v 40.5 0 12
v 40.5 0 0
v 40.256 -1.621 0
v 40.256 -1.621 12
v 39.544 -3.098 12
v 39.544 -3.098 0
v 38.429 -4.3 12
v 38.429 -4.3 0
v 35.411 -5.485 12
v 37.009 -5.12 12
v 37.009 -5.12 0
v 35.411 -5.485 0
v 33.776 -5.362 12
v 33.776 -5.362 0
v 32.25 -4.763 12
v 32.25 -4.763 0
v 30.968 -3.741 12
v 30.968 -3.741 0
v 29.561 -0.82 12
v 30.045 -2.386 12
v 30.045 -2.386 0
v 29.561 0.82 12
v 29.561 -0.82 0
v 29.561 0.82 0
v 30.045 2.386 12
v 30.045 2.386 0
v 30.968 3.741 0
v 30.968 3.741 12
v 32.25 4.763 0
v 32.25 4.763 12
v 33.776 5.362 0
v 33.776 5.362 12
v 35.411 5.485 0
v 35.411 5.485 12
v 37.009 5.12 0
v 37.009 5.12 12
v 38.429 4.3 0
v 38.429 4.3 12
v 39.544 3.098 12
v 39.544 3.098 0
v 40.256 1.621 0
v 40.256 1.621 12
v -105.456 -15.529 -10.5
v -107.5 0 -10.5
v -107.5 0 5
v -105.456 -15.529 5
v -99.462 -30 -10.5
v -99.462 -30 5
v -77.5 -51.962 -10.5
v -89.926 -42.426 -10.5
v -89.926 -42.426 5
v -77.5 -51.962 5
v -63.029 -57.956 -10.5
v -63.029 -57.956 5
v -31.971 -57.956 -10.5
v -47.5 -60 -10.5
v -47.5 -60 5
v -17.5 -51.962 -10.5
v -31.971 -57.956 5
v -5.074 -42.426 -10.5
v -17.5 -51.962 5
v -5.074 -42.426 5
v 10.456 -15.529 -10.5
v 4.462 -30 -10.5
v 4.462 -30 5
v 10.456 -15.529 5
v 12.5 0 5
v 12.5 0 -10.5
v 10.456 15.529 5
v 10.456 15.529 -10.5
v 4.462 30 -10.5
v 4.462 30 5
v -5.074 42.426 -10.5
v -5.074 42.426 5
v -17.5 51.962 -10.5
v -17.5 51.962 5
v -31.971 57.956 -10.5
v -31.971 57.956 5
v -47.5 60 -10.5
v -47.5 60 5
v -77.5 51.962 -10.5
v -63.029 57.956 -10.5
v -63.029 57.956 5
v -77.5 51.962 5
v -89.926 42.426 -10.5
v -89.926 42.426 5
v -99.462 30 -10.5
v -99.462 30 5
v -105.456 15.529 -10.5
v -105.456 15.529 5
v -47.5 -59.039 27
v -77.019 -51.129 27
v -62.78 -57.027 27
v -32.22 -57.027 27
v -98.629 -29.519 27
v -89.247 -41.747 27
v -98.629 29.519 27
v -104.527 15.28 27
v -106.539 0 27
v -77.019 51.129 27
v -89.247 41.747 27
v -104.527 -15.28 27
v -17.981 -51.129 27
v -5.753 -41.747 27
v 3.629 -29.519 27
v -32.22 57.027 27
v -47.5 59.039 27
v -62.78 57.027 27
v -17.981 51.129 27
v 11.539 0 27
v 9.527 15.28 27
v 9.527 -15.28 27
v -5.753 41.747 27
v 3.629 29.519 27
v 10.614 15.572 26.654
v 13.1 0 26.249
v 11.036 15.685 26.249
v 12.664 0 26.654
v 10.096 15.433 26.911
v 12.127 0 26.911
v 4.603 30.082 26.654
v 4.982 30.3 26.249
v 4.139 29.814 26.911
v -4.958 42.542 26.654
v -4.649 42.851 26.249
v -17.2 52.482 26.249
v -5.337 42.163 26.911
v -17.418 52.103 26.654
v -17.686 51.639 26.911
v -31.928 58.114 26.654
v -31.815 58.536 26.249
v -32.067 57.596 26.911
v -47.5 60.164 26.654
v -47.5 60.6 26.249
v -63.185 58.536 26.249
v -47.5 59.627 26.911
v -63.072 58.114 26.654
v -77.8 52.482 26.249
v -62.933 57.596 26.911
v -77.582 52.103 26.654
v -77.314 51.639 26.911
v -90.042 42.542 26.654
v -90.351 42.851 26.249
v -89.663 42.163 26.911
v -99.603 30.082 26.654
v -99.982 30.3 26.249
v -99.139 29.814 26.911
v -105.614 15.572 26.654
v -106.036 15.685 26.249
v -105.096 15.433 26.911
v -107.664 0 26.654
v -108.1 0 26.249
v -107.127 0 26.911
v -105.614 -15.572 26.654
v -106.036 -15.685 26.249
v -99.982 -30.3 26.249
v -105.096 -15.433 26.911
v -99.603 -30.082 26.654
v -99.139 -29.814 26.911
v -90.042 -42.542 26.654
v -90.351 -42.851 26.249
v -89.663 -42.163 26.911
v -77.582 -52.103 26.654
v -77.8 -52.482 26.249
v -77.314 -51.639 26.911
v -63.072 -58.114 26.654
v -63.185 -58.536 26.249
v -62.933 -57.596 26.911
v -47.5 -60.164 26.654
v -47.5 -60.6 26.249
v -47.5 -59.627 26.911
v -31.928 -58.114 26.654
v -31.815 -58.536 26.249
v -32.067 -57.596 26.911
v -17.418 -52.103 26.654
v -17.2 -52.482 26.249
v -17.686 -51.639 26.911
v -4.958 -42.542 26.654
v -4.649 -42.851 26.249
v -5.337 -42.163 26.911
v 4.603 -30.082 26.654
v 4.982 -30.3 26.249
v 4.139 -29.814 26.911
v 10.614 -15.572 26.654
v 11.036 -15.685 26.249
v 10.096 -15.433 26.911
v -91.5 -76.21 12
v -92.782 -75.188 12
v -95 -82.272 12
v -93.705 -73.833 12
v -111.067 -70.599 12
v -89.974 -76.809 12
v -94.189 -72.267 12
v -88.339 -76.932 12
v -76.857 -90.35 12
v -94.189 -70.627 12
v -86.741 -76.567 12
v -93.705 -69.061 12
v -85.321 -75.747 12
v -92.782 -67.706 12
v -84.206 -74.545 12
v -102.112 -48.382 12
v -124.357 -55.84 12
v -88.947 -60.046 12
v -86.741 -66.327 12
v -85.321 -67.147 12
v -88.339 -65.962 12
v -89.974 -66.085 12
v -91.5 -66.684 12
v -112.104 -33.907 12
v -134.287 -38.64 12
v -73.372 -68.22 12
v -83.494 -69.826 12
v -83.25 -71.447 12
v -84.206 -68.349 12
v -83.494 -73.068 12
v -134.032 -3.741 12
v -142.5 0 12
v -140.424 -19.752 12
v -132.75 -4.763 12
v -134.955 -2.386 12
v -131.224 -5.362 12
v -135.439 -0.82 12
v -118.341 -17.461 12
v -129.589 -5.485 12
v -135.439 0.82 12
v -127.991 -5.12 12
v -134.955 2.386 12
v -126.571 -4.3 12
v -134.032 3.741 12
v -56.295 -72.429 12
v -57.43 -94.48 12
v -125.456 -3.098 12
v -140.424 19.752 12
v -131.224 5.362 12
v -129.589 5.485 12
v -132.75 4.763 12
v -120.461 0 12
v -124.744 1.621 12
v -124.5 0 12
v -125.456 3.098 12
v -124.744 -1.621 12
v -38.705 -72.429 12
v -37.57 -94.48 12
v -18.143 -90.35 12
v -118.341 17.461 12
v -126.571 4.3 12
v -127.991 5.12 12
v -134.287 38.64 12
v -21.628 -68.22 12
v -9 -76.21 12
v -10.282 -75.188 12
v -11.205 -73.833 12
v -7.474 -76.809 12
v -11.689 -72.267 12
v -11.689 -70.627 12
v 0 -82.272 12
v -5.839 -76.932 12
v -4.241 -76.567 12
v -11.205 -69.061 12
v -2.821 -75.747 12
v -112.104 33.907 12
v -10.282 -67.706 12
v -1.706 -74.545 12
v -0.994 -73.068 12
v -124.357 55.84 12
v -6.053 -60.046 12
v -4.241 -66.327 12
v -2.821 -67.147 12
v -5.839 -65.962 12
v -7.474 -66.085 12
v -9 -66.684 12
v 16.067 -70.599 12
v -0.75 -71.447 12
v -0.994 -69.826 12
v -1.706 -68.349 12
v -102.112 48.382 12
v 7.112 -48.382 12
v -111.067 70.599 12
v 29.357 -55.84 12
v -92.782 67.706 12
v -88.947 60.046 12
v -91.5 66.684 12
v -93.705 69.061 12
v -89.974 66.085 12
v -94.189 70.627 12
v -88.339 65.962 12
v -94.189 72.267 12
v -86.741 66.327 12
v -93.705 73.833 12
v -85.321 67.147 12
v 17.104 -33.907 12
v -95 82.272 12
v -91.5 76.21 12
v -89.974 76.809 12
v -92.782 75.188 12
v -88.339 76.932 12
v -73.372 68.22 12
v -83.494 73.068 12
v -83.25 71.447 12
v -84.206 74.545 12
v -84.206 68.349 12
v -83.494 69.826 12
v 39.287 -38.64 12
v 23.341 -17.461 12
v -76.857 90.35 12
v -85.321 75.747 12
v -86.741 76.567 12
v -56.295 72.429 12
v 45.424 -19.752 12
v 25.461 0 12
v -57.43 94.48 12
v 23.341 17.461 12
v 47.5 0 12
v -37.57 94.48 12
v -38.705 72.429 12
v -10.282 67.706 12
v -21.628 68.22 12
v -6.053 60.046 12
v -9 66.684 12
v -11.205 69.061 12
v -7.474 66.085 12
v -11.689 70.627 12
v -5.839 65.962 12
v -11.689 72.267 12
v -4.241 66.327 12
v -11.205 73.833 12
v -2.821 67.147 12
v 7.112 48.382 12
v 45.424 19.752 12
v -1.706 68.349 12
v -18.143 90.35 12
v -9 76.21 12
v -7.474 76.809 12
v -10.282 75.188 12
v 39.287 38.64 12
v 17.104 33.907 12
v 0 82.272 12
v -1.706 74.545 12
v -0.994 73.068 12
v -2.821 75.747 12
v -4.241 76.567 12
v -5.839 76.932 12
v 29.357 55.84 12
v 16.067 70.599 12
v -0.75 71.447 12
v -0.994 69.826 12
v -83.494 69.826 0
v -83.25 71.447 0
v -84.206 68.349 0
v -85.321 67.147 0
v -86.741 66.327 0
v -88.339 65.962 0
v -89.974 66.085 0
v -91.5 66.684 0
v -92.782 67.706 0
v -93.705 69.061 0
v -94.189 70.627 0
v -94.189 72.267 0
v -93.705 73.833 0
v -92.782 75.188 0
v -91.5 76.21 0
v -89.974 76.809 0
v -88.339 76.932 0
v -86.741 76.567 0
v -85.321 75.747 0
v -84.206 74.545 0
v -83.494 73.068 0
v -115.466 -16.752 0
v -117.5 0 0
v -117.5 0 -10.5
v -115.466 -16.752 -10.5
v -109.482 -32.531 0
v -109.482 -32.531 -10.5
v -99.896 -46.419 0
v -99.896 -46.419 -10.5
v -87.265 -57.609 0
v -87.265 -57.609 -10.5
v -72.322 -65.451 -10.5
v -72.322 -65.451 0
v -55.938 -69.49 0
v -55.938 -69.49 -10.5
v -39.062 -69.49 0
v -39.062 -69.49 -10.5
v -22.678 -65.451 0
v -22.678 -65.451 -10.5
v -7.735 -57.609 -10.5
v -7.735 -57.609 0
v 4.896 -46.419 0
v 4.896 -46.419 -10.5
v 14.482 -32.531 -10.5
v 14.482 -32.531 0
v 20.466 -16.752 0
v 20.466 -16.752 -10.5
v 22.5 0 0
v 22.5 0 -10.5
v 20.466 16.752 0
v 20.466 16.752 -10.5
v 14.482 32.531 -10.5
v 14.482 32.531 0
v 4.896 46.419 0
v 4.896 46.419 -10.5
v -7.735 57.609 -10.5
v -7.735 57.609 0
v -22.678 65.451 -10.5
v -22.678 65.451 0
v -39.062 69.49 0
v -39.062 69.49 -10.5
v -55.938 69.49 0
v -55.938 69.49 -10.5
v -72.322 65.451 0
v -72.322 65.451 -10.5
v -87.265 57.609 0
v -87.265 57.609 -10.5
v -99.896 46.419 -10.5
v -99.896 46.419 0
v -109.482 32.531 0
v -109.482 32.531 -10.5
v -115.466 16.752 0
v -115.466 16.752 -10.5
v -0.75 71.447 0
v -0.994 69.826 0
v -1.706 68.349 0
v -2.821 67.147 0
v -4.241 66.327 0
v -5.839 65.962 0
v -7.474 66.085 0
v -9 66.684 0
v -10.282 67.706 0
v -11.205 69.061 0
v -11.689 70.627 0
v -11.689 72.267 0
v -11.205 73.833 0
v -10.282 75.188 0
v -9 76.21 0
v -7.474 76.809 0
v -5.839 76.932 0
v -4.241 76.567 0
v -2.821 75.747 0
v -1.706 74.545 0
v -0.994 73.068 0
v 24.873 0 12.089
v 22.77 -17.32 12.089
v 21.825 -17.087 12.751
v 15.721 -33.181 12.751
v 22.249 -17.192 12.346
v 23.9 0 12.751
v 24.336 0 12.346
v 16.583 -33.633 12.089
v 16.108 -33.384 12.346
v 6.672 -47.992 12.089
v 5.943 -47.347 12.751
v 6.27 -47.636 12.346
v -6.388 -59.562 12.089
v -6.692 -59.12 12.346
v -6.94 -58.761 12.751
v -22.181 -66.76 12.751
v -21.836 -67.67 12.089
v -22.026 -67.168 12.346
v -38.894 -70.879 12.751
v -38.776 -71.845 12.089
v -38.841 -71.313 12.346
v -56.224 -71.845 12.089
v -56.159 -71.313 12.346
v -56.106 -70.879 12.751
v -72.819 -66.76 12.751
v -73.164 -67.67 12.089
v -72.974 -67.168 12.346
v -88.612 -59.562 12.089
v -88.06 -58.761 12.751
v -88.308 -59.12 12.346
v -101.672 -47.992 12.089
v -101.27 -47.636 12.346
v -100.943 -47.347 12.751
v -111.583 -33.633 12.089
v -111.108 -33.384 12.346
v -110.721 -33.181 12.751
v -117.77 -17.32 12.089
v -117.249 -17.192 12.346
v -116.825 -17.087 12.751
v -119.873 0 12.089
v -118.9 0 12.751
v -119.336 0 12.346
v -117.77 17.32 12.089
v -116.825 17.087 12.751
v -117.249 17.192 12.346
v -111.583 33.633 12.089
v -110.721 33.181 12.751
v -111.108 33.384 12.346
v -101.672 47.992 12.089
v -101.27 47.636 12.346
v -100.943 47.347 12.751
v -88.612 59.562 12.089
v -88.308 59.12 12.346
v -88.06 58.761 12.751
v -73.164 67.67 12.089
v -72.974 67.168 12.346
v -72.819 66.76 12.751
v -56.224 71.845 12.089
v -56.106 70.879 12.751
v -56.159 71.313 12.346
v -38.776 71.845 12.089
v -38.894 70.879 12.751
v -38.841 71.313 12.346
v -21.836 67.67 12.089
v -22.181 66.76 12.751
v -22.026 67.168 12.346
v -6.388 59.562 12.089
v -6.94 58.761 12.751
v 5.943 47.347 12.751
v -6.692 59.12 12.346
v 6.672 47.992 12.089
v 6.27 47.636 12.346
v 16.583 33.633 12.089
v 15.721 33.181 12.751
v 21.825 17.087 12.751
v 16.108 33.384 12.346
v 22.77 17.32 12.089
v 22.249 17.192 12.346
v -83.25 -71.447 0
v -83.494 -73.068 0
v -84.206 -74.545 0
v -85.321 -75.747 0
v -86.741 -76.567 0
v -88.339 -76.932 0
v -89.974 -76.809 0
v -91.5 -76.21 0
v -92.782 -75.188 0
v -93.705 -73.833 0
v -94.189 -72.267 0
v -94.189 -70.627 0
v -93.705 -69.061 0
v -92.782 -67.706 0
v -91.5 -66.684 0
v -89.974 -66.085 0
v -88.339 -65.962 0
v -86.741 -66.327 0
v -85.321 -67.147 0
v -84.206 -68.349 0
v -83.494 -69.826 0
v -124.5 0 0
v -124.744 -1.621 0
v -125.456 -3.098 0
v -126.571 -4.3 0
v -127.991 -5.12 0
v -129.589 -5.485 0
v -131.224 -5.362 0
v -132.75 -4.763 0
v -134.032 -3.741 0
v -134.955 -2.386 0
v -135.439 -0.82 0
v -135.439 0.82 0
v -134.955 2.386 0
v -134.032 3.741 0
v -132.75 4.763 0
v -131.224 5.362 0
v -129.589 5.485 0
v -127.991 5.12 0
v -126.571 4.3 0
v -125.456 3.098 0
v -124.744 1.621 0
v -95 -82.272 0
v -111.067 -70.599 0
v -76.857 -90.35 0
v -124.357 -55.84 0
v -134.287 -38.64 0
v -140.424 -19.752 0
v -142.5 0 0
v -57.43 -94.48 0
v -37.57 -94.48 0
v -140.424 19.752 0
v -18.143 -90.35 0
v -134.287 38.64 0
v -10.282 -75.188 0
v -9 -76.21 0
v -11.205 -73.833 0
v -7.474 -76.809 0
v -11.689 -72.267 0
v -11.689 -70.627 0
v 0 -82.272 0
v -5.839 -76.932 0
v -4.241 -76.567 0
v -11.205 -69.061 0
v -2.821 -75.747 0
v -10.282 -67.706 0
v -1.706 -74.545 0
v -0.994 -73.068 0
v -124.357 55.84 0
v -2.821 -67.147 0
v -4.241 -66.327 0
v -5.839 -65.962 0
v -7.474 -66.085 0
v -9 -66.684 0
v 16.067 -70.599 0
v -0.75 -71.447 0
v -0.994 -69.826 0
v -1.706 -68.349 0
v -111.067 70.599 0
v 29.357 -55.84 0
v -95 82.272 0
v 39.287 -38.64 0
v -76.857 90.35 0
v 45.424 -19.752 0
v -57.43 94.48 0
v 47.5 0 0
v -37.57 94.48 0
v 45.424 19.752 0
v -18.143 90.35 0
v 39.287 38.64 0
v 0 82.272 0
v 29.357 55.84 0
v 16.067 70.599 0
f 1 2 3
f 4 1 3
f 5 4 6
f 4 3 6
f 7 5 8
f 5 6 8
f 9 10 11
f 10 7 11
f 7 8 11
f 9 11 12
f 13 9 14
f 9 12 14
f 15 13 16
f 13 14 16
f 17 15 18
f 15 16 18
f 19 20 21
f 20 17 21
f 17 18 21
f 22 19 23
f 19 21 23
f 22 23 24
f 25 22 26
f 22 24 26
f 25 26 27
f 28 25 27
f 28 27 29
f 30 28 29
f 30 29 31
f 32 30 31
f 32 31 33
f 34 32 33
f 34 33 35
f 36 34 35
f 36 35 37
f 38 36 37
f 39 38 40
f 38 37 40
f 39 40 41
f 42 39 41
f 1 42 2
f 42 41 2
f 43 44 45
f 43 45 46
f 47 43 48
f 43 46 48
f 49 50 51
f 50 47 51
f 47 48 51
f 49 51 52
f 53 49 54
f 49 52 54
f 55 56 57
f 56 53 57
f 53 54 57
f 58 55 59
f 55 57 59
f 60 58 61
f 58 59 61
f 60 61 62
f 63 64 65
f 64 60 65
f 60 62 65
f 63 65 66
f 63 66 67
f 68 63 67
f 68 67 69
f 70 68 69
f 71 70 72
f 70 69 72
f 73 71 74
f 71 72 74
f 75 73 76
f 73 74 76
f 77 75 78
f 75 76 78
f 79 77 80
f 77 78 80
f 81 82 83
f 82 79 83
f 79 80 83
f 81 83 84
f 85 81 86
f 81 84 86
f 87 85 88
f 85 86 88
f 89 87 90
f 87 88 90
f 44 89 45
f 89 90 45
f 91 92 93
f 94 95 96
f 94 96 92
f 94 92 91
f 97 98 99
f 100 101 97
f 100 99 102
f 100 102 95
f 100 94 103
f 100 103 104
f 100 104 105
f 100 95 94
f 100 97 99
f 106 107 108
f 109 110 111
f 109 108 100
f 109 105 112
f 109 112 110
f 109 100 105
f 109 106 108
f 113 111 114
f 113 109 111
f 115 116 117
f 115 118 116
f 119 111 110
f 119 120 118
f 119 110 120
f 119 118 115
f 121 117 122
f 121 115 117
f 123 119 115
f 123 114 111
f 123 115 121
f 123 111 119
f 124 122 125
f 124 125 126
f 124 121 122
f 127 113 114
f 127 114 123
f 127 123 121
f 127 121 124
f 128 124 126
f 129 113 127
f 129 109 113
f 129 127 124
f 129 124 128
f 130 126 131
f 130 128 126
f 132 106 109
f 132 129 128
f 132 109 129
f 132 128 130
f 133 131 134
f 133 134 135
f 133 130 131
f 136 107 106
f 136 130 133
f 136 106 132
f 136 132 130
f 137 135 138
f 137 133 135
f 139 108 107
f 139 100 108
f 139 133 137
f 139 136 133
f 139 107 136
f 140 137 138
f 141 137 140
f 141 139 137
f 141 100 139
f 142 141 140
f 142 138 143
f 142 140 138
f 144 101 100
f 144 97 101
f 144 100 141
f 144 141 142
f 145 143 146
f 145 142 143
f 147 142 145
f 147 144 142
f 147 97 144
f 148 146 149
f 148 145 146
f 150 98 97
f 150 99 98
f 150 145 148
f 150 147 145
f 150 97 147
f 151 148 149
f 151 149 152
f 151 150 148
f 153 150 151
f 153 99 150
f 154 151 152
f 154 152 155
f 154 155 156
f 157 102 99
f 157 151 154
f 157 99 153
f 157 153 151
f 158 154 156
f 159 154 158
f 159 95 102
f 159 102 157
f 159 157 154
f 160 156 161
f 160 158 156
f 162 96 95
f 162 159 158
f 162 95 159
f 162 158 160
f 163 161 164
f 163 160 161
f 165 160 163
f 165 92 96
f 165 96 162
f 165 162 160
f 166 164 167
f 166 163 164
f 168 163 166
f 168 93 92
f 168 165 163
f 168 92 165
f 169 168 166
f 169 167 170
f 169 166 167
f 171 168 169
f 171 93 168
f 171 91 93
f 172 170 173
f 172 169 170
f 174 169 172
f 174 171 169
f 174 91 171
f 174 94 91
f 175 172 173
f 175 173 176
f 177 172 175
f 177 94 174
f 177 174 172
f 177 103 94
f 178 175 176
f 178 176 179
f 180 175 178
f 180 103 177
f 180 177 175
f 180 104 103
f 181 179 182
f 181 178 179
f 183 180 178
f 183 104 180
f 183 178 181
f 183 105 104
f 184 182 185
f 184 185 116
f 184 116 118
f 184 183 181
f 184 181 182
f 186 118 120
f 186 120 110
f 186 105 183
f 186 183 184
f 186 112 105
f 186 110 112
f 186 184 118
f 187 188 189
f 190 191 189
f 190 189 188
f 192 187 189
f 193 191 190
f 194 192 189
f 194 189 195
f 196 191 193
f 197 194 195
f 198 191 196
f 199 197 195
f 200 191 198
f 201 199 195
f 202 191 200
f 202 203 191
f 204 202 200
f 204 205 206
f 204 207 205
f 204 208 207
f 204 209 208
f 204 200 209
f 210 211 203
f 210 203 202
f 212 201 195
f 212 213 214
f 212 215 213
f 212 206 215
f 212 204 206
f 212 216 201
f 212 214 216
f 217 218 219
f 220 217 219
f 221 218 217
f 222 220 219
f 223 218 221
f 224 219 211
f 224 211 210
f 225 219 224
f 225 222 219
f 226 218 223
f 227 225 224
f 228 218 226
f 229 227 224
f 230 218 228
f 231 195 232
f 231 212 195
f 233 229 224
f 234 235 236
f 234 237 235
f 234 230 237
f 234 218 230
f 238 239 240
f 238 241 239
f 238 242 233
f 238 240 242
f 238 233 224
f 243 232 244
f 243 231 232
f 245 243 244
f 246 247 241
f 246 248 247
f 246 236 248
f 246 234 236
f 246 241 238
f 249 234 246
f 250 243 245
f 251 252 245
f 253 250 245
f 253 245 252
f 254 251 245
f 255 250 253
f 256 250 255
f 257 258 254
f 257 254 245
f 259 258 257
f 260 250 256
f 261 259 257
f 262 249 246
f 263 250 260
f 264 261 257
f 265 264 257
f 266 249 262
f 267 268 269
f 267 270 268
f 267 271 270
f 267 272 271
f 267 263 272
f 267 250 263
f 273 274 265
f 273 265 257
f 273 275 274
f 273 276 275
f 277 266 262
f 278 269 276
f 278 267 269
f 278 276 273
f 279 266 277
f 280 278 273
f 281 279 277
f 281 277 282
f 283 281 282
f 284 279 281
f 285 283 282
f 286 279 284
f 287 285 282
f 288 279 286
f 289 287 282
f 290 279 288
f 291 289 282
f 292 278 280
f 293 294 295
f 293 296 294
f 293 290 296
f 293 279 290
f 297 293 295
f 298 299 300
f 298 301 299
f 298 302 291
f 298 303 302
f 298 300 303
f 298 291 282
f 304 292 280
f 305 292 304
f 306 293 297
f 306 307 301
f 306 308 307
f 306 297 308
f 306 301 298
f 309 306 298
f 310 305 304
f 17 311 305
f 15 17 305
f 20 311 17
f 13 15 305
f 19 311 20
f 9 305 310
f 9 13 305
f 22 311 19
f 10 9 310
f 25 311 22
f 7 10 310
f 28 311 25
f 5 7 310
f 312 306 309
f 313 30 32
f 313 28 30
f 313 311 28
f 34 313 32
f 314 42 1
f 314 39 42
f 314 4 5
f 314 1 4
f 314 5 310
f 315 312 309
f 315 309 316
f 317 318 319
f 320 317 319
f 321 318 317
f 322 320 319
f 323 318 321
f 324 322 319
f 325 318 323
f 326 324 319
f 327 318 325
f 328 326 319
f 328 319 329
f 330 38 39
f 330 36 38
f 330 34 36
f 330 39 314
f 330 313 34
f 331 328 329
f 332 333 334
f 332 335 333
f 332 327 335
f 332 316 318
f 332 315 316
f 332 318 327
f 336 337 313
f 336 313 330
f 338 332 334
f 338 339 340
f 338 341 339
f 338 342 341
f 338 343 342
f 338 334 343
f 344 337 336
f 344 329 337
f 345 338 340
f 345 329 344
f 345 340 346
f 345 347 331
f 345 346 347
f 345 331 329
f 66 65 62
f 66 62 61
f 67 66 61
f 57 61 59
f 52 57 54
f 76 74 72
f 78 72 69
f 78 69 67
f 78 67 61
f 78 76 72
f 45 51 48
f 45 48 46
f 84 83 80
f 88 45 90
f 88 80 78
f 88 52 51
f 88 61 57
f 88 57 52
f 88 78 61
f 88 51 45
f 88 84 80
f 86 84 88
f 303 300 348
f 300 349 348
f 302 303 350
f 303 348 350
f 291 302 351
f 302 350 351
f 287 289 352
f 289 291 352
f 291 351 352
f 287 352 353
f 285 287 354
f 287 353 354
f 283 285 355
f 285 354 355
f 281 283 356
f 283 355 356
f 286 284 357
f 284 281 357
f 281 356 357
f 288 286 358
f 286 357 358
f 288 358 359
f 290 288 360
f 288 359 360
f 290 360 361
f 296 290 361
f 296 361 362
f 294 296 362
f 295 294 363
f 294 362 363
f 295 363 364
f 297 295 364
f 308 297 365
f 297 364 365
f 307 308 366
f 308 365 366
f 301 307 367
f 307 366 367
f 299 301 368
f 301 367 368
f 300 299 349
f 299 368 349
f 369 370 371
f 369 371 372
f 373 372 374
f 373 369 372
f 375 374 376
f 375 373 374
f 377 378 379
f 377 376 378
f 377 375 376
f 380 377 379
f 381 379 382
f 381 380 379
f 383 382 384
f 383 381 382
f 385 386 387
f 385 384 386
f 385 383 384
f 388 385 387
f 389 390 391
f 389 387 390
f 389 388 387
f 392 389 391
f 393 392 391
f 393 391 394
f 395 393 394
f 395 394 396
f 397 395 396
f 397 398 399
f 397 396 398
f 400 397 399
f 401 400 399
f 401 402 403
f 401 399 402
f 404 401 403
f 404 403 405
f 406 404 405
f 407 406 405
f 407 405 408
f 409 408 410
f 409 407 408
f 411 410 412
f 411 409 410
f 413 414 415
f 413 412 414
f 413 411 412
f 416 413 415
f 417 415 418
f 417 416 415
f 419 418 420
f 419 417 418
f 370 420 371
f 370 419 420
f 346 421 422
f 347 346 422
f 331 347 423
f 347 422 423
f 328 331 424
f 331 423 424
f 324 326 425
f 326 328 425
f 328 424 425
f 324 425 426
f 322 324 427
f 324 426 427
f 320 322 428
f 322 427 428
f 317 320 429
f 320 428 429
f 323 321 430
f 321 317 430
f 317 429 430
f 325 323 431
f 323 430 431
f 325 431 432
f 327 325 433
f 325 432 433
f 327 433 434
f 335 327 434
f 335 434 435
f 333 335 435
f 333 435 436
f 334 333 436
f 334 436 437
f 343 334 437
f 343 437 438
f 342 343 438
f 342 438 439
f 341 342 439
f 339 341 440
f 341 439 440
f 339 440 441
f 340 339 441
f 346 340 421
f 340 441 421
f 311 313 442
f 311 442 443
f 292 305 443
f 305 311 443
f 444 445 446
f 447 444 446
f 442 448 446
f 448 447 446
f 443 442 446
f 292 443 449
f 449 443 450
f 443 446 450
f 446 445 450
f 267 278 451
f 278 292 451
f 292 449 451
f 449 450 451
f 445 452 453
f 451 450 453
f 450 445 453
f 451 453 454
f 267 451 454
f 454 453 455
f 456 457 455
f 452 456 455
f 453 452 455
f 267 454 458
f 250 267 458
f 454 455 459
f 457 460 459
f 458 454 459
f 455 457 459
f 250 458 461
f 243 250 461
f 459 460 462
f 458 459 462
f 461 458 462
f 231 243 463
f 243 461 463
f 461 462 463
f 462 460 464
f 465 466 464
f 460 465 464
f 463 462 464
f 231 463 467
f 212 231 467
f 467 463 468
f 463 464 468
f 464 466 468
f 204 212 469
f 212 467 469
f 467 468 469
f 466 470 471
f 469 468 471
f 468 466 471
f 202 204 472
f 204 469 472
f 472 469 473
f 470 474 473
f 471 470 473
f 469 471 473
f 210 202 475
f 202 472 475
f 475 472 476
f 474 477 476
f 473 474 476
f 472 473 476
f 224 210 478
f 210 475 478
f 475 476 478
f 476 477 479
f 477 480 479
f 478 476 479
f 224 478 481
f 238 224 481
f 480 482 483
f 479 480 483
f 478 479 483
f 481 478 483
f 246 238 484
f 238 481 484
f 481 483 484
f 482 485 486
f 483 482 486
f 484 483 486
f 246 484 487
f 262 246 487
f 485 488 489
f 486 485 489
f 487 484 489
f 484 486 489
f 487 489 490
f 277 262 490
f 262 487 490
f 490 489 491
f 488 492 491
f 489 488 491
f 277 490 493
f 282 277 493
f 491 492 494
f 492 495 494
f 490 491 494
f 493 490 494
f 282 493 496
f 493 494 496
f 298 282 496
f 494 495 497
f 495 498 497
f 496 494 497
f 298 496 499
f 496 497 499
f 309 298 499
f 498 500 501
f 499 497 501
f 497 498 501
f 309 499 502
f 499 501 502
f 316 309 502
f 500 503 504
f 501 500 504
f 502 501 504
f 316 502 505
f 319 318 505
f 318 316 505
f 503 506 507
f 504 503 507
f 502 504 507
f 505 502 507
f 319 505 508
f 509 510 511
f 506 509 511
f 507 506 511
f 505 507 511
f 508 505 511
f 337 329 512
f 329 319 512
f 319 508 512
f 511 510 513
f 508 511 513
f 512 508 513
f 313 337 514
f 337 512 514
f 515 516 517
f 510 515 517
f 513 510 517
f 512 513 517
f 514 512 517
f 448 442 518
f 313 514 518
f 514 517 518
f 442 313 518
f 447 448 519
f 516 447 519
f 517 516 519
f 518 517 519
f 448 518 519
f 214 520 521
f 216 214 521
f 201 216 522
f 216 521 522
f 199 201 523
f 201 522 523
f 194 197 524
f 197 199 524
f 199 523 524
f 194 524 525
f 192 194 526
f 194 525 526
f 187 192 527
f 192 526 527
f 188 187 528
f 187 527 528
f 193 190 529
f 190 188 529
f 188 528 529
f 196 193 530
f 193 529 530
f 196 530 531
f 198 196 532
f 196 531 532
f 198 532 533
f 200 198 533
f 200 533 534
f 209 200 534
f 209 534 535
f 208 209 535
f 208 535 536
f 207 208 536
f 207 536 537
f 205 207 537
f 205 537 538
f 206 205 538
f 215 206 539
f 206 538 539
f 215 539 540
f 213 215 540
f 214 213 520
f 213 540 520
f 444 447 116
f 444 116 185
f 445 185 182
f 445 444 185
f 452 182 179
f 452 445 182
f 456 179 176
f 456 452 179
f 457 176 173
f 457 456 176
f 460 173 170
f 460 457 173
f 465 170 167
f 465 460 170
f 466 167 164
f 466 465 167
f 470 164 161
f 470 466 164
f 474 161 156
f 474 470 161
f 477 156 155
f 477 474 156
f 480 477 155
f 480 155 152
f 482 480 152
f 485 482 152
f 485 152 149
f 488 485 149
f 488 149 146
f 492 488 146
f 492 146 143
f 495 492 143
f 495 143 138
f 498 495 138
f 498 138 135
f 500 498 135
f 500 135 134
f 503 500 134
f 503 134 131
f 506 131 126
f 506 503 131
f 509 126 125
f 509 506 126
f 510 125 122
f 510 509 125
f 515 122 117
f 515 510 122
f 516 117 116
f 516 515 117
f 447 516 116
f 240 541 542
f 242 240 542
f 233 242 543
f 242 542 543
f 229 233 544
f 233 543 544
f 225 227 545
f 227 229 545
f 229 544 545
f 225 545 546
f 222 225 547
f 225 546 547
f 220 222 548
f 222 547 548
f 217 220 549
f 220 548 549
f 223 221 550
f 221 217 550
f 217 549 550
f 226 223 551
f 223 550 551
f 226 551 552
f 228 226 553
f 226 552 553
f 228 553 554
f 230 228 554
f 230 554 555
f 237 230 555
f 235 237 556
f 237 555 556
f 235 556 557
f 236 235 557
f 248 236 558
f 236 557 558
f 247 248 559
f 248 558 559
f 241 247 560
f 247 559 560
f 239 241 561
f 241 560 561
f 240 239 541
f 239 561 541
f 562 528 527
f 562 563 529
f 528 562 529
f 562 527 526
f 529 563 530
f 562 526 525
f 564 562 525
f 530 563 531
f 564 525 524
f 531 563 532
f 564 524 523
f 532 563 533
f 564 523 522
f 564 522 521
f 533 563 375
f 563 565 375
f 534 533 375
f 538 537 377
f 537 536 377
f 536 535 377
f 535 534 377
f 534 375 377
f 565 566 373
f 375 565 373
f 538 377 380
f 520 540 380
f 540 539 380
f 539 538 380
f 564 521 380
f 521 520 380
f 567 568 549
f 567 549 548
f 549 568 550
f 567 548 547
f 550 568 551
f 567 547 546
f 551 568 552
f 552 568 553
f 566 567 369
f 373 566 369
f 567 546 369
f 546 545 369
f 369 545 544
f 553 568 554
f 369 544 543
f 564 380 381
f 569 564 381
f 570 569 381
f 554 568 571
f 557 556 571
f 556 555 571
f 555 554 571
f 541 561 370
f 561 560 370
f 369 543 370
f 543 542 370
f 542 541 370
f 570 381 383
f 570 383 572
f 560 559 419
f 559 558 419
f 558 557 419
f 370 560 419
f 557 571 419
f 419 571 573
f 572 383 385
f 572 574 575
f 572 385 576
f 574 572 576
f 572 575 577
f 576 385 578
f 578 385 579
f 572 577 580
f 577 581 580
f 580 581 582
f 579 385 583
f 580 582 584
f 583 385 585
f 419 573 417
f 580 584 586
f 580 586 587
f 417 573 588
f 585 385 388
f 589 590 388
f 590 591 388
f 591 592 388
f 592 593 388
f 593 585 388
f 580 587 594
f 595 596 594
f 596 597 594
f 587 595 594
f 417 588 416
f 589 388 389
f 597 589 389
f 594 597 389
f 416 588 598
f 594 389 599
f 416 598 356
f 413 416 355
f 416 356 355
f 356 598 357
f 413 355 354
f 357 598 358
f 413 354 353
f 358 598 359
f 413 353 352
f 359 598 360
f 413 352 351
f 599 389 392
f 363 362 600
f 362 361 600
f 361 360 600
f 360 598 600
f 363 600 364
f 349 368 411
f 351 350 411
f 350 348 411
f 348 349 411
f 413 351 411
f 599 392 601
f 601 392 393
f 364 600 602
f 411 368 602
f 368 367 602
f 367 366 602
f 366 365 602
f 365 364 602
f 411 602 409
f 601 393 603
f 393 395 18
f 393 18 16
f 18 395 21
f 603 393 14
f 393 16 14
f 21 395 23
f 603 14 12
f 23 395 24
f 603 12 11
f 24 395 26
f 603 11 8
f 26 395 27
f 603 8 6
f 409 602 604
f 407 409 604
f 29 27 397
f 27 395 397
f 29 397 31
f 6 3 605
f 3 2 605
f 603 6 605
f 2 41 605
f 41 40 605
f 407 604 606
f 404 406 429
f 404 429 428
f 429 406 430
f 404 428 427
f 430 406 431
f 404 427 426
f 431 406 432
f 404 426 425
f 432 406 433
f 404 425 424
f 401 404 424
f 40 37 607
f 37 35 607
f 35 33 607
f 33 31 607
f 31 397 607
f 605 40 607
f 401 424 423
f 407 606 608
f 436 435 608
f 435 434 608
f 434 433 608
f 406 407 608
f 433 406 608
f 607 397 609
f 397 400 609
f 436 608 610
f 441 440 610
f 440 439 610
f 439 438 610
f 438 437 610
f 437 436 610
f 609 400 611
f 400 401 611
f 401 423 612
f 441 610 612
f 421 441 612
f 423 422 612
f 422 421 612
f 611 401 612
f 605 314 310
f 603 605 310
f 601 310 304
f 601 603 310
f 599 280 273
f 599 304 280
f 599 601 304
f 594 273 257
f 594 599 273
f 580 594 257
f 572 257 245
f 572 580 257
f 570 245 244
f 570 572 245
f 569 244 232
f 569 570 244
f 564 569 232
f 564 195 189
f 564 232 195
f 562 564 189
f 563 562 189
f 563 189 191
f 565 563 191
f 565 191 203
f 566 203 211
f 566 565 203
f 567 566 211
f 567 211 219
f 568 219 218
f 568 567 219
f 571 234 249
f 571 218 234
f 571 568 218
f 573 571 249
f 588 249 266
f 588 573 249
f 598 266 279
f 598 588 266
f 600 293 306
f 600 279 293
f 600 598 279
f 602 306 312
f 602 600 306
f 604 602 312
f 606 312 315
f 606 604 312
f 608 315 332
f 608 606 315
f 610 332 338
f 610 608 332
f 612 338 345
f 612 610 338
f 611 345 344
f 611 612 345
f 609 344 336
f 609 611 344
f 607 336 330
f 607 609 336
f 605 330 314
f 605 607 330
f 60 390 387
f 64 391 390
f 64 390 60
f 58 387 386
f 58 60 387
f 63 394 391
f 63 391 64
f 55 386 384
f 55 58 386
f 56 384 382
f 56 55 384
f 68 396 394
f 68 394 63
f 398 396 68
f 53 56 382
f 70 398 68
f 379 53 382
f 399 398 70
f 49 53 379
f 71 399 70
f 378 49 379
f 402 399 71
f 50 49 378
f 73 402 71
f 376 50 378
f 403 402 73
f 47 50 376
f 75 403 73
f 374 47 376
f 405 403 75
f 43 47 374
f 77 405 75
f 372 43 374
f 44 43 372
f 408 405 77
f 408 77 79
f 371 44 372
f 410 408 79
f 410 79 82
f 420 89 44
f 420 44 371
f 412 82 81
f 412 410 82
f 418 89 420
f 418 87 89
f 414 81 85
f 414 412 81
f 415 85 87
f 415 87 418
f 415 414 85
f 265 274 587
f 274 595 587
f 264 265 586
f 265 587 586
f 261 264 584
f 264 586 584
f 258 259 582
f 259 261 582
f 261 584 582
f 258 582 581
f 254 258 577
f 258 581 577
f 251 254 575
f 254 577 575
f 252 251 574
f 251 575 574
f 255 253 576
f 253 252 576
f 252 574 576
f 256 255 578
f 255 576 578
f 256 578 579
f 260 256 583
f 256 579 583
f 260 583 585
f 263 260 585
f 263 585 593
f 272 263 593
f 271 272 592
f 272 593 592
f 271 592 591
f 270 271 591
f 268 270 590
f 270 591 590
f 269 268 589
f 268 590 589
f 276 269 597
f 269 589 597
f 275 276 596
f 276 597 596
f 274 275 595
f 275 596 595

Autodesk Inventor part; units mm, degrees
ref_plane "YZ Plane" through (0, 0, 0) normal (1, 0, 0) x (0, 1, 0)
ref_plane "工作平面1" through (0, 0, 0) normal (0, 0, 1) x (1, 0, 0)
sketch "草图1" plane through (0, 0, 0) normal (0, 0, 1) x (1, 0, 0)
  arc A0 (-47.5, -70) -> (-47.5, 70) centre (-47.5, 0) ccw construction
  circle A1 centre (-47.5, 0) radius 82.5 construction
  arc A2 (-47.5, -95) -> (-47.5, 95) centre (-47.5, 0) ccw construction
  line L0 (-47.5, 70) -> (-47.5, 95) construction
  arc A3 (-47.5, -70) -> (-47.5, 70) centre (-47.5, 0) ccw construction
  line L1 (-47.5, -95) -> (-47.5, -70) construction
  arc A4 (-47.5, -70) -> (-47.5, 70) centre (-47.5, 0) ccw construction
  circle A5 centre (-47.5, 0) radius 95
  circle A6 centre (-130, 0) radius 5.5
  line L2 (-180.5, 0) -> (85.5, 0) construction
  circle A7 centre (-88.75, -71.4471) radius 5.5
  circle A8 centre (-6.25, -71.4471) radius 5.5
  circle A9 centre (35, 0) radius 5.5
  circle A10 centre (-6.25, 71.4471) radius 5.5
  circle A11 centre (-88.75, 71.4471) radius 5.5
  point P0 (0, 0)
  dimension "d0" = 165
  dimension "d1" = 11
  dimension "d4" = 360
extrude "拉伸1" add sketch "草图1" along normal blind 12
sketch "草图2" plane through (-47.5, 0, 0) normal (0, 0, -1) x (-1, 0, 0)
  arc A0 (0, 70) -> (0, -70) centre (0, 0) ccw construction
  circle A1 centre (0, 0) radius 70
  circle A2 centre (0, 0) radius 60
  point P0 (-47.5, 0)
  dimension "d8" = 10
extrude "拉伸2" add sketch "草图2" along normal blind 10.5
sketch "草图3" plane through (-47.5, 0, 12) normal (0, 0, 1) x (1, 0, 0)
  circle A0 centre (0, 0) radius 70 construction
  circle A1 centre (0, 0) radius 70 construction
  circle A2 centre (0, 0) radius 72
  point P0 (47.5, 0)
  dimension "d11" = 2
ref_plane "工作平面2" through (-47.5, 0, 27) normal (0, 0, 1) x (1, 0, 0)
sketch "草图4" plane through (-47.5, 0, 27) normal (0, 0, 1) x (1, 0, 0)
  circle A0 centre (0, 0) radius 72 construction
  circle A1 centre (0, 0) radius 60 projected
  point P0 (47.5, 0)
loft "放样1" add profiles "草图3", "草图4"
sketch "草图5" plane through (-47.5, 0, 0) normal (0, 0, -1) x (-1, 0, 0)
  circle A0 centre (0, 0) radius 60 projected
  point P0 (-47.5, 0)
extrude "拉伸3" cut sketch "草图5" against normal blind 5
fillet "圆角1" radius 2 2 edges at (-119.5, 0, 12) (-107.5, 0, 27)
properties part number "轴承端盖2"
